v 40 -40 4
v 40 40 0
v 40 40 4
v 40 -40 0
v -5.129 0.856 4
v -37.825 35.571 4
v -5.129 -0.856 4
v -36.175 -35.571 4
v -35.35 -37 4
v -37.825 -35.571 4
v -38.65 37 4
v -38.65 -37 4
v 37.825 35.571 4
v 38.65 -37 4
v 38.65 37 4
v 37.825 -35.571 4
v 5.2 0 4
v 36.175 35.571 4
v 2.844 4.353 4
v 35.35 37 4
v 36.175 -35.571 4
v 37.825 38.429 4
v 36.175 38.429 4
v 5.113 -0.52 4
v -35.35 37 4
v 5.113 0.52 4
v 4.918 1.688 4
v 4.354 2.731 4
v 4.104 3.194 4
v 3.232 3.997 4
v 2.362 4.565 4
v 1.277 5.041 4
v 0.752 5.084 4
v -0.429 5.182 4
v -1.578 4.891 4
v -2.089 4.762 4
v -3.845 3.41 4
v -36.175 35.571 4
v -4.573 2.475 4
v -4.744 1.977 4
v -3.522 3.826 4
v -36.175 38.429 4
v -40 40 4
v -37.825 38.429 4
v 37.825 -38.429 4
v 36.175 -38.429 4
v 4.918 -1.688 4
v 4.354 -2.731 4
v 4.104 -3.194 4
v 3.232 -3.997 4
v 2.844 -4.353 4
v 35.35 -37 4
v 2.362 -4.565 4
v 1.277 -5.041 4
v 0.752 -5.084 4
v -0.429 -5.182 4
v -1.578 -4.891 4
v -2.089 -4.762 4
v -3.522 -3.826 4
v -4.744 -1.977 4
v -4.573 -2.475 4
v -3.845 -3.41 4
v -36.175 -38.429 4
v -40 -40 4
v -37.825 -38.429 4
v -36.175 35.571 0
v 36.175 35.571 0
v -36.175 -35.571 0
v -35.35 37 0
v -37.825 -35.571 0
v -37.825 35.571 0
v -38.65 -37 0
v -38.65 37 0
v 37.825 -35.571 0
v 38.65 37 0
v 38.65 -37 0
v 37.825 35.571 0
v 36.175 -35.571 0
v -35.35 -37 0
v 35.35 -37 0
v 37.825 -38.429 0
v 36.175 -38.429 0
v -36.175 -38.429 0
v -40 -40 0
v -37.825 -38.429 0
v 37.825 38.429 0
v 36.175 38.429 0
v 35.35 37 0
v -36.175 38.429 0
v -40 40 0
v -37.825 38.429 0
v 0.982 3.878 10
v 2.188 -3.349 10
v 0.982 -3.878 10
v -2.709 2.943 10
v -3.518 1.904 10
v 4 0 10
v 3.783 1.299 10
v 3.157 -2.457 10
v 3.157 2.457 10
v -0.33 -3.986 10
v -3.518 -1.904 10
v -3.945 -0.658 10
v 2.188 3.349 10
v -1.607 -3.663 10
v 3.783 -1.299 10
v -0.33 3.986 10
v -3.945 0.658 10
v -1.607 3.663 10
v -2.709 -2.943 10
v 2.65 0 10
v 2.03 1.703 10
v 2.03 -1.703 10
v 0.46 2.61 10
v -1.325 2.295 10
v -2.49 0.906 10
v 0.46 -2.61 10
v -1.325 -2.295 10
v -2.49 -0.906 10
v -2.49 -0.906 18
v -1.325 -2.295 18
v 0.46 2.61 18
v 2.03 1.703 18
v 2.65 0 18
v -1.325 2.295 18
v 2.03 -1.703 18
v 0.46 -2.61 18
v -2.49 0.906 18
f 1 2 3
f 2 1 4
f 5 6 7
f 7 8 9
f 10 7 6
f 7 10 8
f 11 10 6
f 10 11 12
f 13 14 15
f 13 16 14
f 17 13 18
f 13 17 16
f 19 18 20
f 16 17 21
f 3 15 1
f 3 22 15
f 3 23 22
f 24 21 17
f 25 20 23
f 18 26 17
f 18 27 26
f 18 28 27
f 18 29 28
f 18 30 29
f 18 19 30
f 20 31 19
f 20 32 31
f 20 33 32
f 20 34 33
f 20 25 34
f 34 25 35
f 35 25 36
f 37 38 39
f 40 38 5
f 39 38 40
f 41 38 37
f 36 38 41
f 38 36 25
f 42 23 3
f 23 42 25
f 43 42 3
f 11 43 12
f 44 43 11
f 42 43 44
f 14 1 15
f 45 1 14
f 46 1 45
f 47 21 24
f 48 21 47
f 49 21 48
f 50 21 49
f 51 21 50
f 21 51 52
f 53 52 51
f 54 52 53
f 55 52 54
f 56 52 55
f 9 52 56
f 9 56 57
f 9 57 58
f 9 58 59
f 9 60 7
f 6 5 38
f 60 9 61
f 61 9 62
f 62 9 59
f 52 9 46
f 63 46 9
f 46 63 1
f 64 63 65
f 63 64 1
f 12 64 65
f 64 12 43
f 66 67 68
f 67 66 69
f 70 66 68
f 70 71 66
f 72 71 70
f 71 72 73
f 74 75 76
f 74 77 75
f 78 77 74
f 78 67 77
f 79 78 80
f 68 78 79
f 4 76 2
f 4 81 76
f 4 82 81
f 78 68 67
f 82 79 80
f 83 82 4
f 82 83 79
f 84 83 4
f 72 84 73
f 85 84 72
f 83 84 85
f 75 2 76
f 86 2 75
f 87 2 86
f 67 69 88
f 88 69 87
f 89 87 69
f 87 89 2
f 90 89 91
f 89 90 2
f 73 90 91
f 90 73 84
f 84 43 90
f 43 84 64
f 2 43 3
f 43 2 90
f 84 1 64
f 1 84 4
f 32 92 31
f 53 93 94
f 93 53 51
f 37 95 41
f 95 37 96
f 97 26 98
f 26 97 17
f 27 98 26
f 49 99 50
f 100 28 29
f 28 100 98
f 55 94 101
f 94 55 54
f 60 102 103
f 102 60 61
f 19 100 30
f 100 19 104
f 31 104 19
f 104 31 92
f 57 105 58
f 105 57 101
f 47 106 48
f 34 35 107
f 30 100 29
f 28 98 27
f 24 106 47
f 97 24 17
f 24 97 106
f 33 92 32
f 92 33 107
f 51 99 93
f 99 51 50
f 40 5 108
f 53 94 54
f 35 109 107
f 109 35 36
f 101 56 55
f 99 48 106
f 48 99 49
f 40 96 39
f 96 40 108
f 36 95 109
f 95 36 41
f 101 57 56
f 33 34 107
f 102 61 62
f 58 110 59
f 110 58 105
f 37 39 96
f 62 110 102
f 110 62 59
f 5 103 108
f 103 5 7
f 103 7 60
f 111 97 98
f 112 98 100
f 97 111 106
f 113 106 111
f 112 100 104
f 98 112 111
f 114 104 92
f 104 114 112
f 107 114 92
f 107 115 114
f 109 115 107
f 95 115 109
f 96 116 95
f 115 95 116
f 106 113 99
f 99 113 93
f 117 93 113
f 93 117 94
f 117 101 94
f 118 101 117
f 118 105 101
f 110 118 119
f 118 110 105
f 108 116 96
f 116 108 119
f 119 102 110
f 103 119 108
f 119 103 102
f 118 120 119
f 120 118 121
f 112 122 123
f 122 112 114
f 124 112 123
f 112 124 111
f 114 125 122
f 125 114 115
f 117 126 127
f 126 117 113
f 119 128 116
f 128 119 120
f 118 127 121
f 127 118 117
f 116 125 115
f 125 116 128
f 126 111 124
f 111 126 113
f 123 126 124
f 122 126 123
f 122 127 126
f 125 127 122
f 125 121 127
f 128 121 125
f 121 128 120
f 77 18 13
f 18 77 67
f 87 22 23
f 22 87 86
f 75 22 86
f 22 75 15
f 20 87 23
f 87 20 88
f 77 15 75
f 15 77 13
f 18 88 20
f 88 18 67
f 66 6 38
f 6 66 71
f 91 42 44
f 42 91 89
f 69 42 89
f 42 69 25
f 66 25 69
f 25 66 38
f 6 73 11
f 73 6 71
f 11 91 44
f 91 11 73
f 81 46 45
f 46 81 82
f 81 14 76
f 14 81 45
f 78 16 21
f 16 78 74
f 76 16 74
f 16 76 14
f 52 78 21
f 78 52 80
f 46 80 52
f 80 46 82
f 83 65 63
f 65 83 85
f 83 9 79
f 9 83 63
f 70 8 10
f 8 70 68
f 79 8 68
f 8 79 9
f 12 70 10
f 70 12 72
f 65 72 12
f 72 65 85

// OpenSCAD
difference()
{
union()
    {
standBTC();
    cylinder(h=10, r1=6, r2 =4);
    cylinder(r=5.3/2, h=18);
    }
  //  cylinder(r=5.3/2, h=18);
    
    translate([37,37,0])
    cylinder(r=3.3/2, h=9);
    translate([-37,37,0])
    cylinder(r=3.3/2, h=9);
    translate([37,-37,0])
    cylinder(r=3.3/2, h=9);
    translate([-37,-37,0])
    cylinder(r=3.3/2, h=9);
    

}  

module standBTC()
{
translate([-40,-40,0])
cube([80,80,4]);
//coin();
}
module coin()
{


rotate([0,0,45])
translate([0,0,43])
    {
union()
        {
logo();
translate([0,5,0])
rotate([90,0,0])
cylinder(h=10, r=50);
            
}
}
}




module oldlogo()
{
import("logo3.stl");
}
module logo()
{
    import("btclogo2.stl");
    }
